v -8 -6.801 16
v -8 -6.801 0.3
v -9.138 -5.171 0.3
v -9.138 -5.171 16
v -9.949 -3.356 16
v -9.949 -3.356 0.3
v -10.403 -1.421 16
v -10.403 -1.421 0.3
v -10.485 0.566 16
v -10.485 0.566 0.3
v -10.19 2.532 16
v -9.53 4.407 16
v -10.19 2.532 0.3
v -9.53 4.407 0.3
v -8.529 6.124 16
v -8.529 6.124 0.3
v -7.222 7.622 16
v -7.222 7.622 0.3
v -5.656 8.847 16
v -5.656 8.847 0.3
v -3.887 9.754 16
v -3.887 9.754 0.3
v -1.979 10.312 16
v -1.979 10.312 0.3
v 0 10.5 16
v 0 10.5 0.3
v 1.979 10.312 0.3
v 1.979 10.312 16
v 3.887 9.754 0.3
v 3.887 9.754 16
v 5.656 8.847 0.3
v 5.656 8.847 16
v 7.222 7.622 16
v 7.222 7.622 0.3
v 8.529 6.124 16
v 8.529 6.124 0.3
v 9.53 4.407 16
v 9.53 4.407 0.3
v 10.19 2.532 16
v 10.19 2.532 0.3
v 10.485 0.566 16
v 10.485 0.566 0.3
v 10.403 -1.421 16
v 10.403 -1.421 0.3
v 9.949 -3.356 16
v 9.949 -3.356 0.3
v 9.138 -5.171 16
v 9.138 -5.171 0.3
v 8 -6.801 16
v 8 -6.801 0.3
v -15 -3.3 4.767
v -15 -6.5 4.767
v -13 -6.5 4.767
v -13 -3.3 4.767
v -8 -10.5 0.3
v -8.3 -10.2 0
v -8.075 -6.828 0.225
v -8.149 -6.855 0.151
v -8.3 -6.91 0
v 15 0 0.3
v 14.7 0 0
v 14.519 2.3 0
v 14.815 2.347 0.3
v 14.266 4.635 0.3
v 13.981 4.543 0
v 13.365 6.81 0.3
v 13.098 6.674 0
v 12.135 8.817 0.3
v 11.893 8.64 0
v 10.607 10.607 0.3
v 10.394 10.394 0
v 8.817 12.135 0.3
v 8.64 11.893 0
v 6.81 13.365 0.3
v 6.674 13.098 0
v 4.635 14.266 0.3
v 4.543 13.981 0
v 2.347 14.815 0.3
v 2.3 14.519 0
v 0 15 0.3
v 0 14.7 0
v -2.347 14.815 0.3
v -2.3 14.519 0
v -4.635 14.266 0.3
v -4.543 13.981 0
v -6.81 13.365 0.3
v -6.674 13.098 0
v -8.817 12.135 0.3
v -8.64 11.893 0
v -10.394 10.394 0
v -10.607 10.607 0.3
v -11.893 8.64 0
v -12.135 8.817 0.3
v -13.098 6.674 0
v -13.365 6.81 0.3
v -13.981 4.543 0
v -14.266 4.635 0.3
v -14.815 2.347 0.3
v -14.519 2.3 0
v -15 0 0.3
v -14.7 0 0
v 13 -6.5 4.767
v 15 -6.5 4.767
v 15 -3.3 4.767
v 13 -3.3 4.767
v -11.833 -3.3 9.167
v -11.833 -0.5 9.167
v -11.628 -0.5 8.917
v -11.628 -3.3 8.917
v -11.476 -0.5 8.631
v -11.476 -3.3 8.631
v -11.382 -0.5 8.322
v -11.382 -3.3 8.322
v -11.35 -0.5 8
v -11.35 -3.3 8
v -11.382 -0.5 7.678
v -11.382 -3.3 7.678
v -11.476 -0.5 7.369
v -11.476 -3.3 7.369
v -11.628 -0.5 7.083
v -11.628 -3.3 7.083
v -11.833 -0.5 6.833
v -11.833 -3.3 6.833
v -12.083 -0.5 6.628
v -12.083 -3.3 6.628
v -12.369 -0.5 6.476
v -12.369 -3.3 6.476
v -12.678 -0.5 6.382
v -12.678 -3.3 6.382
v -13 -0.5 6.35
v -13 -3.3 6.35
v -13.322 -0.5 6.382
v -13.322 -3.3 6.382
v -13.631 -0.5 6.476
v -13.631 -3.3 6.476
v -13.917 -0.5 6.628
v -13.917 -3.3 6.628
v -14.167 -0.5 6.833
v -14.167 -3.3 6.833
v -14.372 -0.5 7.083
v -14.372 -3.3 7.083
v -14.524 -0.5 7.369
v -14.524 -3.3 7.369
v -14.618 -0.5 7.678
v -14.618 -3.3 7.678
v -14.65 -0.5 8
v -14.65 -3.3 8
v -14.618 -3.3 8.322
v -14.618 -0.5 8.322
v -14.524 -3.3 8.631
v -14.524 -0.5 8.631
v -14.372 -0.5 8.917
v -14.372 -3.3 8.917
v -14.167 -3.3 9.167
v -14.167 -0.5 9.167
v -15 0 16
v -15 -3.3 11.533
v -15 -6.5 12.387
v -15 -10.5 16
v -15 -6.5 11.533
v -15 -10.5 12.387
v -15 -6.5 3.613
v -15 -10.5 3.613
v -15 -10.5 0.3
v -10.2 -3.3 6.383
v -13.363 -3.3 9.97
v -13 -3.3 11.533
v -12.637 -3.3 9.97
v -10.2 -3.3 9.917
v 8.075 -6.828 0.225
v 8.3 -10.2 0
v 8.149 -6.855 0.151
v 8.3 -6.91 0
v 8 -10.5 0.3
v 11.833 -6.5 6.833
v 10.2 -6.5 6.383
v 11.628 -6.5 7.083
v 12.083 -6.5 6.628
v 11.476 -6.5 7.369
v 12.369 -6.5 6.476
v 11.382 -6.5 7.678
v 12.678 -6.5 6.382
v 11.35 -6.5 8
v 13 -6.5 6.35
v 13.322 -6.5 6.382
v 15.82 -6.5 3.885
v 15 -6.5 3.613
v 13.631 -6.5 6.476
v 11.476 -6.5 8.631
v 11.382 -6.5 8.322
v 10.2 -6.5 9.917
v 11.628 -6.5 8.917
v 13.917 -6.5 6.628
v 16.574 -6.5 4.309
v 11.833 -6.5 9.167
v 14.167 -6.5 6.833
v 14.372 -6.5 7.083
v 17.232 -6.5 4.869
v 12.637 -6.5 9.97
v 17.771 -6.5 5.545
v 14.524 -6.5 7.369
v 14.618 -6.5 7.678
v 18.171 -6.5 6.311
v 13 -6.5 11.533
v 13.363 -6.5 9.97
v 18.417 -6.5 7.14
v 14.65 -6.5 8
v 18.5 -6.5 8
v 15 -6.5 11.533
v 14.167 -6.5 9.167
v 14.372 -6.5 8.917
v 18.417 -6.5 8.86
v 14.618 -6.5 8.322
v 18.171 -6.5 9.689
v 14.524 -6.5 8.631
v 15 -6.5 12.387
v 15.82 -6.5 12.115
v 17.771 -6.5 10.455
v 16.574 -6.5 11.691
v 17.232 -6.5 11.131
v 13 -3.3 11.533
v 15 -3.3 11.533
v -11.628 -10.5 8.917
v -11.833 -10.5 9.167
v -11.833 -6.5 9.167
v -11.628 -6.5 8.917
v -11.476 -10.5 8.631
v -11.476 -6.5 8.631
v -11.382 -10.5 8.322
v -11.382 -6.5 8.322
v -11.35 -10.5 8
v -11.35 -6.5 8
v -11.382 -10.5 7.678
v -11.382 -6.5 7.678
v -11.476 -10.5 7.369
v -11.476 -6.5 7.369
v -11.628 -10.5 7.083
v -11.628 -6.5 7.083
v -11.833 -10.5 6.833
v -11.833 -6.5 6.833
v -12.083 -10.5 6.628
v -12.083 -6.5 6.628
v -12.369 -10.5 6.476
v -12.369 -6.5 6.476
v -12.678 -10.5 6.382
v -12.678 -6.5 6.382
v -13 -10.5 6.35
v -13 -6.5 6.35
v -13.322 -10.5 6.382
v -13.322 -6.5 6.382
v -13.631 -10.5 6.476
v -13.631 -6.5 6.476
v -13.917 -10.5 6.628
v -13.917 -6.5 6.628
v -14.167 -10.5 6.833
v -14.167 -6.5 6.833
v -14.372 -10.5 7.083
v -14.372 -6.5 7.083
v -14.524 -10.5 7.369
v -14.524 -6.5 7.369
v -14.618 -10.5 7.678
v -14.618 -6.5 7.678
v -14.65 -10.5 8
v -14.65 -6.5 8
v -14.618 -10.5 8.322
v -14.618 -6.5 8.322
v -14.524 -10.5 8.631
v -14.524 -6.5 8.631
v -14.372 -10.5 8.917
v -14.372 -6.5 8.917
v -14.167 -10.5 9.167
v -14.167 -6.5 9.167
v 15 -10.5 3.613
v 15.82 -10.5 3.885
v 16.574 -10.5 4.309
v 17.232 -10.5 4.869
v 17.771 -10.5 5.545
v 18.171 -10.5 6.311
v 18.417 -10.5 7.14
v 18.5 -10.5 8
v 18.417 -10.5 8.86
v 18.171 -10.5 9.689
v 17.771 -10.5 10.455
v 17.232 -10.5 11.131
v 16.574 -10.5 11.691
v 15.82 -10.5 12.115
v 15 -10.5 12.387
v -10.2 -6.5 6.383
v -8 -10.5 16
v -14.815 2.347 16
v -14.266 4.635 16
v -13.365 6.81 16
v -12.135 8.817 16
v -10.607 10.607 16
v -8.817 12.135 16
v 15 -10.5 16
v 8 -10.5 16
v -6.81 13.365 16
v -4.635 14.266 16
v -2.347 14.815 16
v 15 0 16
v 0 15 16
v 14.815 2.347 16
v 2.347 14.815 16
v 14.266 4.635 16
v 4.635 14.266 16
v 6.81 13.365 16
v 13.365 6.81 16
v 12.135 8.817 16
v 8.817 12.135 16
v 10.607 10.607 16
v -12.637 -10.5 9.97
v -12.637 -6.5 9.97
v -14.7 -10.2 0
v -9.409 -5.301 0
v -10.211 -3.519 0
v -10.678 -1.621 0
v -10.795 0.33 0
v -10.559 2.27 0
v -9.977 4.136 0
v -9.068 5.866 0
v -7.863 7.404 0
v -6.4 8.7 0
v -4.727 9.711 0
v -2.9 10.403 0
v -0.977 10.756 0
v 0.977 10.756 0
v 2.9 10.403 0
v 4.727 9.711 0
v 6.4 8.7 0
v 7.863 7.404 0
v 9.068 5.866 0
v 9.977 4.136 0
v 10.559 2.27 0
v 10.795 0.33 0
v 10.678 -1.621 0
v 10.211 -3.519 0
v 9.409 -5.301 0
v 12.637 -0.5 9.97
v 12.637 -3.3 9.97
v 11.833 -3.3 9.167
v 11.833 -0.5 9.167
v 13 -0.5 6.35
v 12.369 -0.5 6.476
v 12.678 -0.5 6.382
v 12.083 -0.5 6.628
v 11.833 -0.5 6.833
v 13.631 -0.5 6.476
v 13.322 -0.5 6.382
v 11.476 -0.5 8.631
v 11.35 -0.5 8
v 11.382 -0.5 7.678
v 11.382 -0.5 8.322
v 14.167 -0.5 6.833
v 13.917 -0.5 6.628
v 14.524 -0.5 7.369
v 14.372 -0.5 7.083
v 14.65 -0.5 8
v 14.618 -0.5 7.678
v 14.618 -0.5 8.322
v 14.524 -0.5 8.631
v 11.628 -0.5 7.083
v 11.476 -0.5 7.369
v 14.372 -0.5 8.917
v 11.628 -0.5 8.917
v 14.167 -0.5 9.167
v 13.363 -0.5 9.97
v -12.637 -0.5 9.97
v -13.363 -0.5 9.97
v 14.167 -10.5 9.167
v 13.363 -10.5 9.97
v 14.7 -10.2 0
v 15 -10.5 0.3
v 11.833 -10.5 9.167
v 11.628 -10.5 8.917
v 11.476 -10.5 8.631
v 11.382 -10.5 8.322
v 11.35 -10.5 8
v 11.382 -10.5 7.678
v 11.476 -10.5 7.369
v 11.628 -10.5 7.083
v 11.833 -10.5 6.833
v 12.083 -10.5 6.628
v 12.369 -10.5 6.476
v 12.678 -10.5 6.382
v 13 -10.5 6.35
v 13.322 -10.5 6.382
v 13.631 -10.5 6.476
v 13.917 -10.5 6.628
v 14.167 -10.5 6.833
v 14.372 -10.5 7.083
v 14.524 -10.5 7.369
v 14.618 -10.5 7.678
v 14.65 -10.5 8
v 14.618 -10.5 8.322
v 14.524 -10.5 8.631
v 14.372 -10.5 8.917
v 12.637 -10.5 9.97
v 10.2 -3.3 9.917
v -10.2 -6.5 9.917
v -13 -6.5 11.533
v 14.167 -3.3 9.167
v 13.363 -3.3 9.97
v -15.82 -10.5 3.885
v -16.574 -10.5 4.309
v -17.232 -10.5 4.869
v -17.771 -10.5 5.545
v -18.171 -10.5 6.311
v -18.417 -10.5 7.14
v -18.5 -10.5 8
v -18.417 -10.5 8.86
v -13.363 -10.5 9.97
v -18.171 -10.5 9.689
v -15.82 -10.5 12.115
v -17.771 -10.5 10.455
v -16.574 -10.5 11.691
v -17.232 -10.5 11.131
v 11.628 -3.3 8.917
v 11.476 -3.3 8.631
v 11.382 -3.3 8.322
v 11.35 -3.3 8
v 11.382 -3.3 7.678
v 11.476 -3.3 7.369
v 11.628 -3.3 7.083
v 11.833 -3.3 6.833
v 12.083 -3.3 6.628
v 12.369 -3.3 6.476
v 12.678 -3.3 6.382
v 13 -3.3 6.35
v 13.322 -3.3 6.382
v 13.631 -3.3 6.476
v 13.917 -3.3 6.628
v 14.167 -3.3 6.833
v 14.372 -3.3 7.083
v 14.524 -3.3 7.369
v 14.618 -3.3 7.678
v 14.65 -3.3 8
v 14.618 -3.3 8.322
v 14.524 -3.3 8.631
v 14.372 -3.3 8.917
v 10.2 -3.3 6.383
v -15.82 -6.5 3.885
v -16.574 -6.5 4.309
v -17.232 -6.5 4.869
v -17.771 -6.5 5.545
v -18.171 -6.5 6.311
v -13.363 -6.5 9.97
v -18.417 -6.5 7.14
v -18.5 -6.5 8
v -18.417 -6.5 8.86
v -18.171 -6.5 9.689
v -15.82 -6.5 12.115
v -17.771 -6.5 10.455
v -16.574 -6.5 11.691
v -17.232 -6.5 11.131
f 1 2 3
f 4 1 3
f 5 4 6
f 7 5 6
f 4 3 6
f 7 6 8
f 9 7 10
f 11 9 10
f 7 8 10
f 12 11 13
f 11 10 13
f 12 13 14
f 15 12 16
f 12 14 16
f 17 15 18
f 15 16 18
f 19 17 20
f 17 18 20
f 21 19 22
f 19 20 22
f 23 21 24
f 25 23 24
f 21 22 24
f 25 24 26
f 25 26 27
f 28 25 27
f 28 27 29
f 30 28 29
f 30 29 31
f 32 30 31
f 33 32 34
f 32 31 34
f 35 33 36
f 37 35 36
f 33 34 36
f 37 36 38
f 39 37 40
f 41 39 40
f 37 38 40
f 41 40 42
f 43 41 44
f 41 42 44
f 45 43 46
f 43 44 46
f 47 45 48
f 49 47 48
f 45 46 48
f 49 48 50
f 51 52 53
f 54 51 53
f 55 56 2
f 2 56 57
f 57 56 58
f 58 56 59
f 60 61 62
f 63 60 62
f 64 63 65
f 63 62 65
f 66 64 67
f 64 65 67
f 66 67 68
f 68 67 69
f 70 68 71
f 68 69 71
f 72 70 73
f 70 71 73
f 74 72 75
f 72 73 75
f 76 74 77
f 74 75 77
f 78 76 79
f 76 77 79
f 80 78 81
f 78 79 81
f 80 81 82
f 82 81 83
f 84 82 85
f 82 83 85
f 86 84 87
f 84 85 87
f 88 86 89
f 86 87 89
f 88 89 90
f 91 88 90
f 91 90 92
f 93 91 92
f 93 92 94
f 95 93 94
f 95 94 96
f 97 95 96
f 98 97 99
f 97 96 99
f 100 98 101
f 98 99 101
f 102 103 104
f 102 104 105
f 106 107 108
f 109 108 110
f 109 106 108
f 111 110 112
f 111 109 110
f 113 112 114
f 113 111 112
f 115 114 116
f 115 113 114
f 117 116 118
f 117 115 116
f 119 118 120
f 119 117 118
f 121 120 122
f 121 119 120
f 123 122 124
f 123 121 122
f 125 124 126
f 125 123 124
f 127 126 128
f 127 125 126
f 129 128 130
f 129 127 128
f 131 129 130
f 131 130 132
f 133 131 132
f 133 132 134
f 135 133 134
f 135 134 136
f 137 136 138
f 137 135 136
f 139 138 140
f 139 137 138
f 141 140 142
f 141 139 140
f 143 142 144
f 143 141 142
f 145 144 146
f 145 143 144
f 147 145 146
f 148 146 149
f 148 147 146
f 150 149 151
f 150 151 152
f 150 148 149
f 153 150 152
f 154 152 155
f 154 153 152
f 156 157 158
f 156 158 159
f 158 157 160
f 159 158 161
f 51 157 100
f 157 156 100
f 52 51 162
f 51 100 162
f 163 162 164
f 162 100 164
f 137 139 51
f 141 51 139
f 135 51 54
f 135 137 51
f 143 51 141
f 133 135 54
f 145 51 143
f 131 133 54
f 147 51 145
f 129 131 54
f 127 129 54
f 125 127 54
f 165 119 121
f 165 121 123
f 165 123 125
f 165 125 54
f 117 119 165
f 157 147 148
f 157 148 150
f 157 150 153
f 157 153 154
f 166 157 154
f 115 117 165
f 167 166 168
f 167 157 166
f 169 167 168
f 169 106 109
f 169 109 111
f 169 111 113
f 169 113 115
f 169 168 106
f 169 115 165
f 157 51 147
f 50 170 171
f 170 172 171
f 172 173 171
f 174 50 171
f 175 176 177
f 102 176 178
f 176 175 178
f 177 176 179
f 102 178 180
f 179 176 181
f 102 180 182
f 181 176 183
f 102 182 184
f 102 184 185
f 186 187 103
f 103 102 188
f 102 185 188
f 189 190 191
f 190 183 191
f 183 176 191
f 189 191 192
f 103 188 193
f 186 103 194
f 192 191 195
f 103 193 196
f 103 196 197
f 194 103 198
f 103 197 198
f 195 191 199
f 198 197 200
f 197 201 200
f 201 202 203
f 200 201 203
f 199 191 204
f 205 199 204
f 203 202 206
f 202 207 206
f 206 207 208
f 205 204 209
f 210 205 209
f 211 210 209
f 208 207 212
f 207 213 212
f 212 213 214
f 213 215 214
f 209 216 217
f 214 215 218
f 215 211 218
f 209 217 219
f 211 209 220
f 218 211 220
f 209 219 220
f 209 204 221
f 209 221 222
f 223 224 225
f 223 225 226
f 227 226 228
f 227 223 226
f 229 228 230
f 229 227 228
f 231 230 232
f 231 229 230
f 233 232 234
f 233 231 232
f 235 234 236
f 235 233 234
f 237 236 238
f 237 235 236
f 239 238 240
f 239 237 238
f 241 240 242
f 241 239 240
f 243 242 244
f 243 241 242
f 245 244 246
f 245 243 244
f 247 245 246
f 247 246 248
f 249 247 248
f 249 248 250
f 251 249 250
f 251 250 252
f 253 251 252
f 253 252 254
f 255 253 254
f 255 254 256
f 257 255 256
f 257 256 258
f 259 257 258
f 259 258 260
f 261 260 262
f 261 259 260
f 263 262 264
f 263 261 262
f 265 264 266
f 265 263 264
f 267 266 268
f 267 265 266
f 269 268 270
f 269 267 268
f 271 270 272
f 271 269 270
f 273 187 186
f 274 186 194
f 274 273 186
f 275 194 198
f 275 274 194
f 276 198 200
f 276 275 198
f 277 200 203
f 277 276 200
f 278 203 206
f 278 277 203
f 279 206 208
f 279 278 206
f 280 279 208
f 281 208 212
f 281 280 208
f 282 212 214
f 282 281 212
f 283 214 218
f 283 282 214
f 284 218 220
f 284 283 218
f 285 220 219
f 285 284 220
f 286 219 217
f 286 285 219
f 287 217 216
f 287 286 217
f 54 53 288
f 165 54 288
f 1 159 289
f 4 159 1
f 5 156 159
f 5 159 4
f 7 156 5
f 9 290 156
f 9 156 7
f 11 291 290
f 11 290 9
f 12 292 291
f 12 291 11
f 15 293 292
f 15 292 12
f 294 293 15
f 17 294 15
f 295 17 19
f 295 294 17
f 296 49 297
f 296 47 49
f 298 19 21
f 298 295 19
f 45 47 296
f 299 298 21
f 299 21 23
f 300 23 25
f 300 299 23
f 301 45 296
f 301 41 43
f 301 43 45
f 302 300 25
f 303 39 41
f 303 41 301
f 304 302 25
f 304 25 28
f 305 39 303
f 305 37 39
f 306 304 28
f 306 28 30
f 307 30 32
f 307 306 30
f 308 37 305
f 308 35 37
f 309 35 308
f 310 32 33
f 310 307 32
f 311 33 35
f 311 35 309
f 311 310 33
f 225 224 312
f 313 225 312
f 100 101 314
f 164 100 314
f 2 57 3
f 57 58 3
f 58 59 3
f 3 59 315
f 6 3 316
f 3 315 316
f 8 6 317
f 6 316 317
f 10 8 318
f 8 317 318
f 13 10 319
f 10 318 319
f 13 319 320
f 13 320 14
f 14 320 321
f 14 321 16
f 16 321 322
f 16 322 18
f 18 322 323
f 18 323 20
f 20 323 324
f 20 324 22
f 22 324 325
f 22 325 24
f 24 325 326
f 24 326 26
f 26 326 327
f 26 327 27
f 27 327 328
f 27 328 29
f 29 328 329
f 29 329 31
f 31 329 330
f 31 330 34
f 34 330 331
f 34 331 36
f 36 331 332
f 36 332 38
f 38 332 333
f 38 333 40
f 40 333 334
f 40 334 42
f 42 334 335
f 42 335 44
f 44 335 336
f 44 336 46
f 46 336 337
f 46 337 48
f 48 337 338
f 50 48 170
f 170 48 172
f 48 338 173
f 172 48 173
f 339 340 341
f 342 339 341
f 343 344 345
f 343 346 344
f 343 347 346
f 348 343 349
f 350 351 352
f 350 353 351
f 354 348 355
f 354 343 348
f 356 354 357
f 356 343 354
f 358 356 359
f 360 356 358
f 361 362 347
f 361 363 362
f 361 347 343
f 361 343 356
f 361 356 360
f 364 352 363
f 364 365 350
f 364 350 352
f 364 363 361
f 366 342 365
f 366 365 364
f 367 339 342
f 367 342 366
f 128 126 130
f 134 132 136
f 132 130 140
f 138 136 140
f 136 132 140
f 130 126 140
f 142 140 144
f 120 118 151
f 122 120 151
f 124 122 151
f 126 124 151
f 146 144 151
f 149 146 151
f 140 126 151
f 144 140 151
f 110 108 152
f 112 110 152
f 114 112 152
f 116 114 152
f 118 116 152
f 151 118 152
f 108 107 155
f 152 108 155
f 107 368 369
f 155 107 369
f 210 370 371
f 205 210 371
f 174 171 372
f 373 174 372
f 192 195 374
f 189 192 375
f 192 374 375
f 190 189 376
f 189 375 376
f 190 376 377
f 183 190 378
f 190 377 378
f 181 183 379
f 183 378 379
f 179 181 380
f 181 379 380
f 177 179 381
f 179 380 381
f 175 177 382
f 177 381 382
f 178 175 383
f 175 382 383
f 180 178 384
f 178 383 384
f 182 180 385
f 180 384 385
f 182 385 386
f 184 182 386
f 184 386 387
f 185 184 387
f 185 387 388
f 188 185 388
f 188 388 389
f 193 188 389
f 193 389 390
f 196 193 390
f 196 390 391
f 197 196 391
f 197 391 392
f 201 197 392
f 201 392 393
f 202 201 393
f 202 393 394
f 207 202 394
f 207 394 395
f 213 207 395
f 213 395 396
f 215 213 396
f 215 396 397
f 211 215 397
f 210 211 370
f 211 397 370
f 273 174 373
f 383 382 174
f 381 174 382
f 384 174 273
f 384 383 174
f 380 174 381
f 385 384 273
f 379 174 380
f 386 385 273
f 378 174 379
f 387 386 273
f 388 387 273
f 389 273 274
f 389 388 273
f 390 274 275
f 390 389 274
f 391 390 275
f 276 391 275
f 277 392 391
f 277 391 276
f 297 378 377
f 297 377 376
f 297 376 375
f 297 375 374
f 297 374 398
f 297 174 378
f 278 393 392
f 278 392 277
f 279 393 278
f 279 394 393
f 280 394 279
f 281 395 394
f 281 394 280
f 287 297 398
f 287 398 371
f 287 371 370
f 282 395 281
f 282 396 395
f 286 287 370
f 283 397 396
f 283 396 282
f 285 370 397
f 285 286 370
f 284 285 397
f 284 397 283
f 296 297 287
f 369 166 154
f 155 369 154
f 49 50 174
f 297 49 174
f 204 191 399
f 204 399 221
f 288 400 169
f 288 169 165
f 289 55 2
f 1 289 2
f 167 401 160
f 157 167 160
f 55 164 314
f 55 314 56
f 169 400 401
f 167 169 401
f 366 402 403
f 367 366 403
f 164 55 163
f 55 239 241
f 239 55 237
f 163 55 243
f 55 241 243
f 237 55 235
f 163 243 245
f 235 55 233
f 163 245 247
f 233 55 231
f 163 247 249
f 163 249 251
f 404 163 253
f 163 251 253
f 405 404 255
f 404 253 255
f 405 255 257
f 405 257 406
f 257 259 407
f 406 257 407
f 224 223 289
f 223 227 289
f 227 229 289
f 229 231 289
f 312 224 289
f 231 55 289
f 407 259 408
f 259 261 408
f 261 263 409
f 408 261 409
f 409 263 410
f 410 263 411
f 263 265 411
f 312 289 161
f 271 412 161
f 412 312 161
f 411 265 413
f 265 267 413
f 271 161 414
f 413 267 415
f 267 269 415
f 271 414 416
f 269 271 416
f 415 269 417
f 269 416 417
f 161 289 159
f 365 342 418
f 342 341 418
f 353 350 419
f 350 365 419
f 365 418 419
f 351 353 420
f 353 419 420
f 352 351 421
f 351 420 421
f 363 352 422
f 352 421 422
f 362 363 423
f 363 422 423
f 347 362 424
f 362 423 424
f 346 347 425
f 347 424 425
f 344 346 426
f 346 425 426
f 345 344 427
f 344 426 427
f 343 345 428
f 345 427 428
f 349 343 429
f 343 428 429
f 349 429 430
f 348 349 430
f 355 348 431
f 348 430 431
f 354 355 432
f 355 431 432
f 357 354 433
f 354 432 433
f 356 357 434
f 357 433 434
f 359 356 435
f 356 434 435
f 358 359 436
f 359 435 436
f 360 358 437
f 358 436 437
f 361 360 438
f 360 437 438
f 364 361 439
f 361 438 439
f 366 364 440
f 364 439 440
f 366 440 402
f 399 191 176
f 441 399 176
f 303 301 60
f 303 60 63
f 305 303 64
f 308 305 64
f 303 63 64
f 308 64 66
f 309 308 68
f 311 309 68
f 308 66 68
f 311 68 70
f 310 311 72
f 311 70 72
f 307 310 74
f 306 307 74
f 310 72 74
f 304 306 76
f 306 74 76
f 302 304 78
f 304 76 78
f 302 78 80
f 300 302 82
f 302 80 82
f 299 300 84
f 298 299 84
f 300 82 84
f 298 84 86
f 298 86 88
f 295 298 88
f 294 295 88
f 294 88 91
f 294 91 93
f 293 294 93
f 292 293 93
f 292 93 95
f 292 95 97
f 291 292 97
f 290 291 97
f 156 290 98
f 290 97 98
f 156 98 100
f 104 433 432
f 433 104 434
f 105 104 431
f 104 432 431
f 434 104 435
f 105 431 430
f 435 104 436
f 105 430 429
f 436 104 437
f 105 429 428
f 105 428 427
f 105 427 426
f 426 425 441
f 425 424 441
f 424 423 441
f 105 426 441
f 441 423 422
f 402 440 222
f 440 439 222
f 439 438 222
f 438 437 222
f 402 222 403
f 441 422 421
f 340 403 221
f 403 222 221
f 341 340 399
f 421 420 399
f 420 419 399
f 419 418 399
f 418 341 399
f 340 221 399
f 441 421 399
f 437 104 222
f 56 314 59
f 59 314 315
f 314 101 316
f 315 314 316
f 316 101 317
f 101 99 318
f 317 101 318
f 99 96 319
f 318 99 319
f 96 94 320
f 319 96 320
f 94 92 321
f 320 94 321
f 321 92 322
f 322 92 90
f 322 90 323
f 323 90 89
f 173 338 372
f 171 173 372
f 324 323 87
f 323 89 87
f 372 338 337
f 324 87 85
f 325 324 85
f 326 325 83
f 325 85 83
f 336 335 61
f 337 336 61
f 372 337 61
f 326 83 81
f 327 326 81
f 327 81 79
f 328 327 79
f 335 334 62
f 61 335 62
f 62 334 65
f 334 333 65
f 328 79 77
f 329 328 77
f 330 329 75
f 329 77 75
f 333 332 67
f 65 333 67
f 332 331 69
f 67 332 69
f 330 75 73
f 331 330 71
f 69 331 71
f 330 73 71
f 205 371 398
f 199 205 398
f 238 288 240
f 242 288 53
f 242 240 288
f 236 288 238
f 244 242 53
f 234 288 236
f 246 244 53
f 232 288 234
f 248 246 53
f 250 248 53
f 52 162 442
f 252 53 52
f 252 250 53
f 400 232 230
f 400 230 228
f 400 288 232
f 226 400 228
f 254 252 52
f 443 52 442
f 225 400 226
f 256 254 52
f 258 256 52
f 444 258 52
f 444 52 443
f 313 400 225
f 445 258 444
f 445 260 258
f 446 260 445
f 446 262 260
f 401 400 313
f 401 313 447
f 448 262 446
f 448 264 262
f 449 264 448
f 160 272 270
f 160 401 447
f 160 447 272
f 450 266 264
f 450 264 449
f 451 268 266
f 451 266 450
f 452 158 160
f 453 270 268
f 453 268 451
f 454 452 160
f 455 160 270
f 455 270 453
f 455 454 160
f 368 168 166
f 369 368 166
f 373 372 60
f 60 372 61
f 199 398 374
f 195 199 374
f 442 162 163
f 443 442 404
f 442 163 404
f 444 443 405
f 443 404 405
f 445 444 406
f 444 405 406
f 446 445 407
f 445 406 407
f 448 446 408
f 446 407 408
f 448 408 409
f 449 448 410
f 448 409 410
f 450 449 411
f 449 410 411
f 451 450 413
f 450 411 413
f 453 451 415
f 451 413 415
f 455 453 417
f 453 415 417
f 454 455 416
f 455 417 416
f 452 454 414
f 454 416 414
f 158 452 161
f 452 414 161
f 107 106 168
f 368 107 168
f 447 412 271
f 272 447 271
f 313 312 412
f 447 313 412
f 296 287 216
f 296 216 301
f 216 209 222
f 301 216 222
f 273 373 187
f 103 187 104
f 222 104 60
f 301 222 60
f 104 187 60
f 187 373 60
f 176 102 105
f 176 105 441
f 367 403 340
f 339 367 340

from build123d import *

# Parameters (mm, degrees)
BOSS_EXTRUDE1_DEPTH = 16
SKETCH4_R           = 4.5
BOSS_EXTRUDE2_DEPTH = 4
SKETCH2_R           = 1.65
CUT_EXTRUDE1_DEPTH  = 10
CUT_EXTRUDE2_START  = -4
CUT_EXTRUDE2_DEPTH  = 3.2
CHAMFER1_SIZE       = 0.3
CUT_EXTRUDE3_DEPTH  = 10


with BuildPart() as part:
    # Sketch1 → Boss-Extrude1 (new body)
    with BuildSketch(Plane.XY):
        with BuildLine():
            Line((8, -6.800735254), (8, -10.5))
            Line((8, -10.5), (15, -10.5))
            Line((15, -10.5), (15, 0))
            ThreePointArc((15, 0), (0, 15), (-15, 0))
            Line((-15, 0), (-15, -10.5))
            Line((-15, -10.5), (-8, -10.5))
            Line((-8, -10.5), (-8, -6.800735254))
            ThreePointArc((-8, -6.800735254), (0, 10.5), (8, -6.800735254))
        make_face()
    extrude(amount=BOSS_EXTRUDE1_DEPTH)

    # Sketch4 → Boss-Extrude2 (add)
    with BuildSketch(Plane.XZ.offset(10.5)):
        with Locations((14, 8)):
            Circle(SKETCH4_R)
    boss_extrude2 = extrude(amount=-BOSS_EXTRUDE2_DEPTH)

    # Sketch2 → Cut-Extrude1 (cut)
    with BuildSketch(Plane.XZ.offset(10.5)):
        with Locations((13, 8)):
            Circle(SKETCH2_R)
    cut_extrude1 = extrude(amount=-CUT_EXTRUDE1_DEPTH, mode=Mode.SUBTRACT)

    # Sketch3 → Cut-Extrude2 (cut)
    with BuildSketch(Plane.XZ.offset(10.5).offset(CUT_EXTRUDE2_START)):
        Polygon((10.2, 9.616580754), (10.2, 9.916580754), (13, 11.533161507), (17.758039714, 11.533161507), (17.758039714, 11.233161507), (17.758039714, 4.766838493), (13, 4.766838493), (10.2, 6.383419246), align=None)
    cut_extrude2 = extrude(amount=-CUT_EXTRUDE2_DEPTH, mode=Mode.SUBTRACT)

    # Mirror1: Boss-Extrude2, Cut-Extrude1, Cut-Extrude2 across plane
    add(boss_extrude2.mirror(Plane(origin=(0, 0, 0), x_dir=(0, 0, 1), z_dir=(1, 0, 0))))
    add(cut_extrude1.mirror(Plane(origin=(0, 0, 0), x_dir=(0, 0, 1), z_dir=(1, 0, 0))), mode=Mode.SUBTRACT)
    add(cut_extrude2.mirror(Plane(origin=(0, 0, 0), x_dir=(0, 0, 1), z_dir=(1, 0, 0))), mode=Mode.SUBTRACT)

    # Chamfer1
    chamfer1_edges = [part.edges().sort_by_distance(p)[0] for p in [
        (-15, -5.25, 0),
        (0, 15, 0),
        (15, -5.25, 0),
        (11.5, -10.5, 0),
        (8, -8.650367627, 0),
        (0, 10.5, 0),
        (-8, -8.650367627, 0),
        (-11.5, -10.5, 0),
    ]]
    chamfer(chamfer1_edges, length=CHAMFER1_SIZE)

    # Sketch5 → Cut-Extrude3 (cut)
    with BuildSketch(Plane.XZ.offset(10.5)):
        Polygon((-13, 8), (-11.833273811, 9.166726189), (-12.636547622, 9.97), (-13.363452378, 9.97), (-14.166726189, 9.166726189), align=None)
        Polygon((13, 8), (14.166726189, 9.166726189), (13.363452378, 9.97), (12.636547622, 9.97), (11.833273811, 9.166726189), align=None)
    extrude(amount=-CUT_EXTRUDE3_DEPTH, mode=Mode.SUBTRACT)


solid = part.part
